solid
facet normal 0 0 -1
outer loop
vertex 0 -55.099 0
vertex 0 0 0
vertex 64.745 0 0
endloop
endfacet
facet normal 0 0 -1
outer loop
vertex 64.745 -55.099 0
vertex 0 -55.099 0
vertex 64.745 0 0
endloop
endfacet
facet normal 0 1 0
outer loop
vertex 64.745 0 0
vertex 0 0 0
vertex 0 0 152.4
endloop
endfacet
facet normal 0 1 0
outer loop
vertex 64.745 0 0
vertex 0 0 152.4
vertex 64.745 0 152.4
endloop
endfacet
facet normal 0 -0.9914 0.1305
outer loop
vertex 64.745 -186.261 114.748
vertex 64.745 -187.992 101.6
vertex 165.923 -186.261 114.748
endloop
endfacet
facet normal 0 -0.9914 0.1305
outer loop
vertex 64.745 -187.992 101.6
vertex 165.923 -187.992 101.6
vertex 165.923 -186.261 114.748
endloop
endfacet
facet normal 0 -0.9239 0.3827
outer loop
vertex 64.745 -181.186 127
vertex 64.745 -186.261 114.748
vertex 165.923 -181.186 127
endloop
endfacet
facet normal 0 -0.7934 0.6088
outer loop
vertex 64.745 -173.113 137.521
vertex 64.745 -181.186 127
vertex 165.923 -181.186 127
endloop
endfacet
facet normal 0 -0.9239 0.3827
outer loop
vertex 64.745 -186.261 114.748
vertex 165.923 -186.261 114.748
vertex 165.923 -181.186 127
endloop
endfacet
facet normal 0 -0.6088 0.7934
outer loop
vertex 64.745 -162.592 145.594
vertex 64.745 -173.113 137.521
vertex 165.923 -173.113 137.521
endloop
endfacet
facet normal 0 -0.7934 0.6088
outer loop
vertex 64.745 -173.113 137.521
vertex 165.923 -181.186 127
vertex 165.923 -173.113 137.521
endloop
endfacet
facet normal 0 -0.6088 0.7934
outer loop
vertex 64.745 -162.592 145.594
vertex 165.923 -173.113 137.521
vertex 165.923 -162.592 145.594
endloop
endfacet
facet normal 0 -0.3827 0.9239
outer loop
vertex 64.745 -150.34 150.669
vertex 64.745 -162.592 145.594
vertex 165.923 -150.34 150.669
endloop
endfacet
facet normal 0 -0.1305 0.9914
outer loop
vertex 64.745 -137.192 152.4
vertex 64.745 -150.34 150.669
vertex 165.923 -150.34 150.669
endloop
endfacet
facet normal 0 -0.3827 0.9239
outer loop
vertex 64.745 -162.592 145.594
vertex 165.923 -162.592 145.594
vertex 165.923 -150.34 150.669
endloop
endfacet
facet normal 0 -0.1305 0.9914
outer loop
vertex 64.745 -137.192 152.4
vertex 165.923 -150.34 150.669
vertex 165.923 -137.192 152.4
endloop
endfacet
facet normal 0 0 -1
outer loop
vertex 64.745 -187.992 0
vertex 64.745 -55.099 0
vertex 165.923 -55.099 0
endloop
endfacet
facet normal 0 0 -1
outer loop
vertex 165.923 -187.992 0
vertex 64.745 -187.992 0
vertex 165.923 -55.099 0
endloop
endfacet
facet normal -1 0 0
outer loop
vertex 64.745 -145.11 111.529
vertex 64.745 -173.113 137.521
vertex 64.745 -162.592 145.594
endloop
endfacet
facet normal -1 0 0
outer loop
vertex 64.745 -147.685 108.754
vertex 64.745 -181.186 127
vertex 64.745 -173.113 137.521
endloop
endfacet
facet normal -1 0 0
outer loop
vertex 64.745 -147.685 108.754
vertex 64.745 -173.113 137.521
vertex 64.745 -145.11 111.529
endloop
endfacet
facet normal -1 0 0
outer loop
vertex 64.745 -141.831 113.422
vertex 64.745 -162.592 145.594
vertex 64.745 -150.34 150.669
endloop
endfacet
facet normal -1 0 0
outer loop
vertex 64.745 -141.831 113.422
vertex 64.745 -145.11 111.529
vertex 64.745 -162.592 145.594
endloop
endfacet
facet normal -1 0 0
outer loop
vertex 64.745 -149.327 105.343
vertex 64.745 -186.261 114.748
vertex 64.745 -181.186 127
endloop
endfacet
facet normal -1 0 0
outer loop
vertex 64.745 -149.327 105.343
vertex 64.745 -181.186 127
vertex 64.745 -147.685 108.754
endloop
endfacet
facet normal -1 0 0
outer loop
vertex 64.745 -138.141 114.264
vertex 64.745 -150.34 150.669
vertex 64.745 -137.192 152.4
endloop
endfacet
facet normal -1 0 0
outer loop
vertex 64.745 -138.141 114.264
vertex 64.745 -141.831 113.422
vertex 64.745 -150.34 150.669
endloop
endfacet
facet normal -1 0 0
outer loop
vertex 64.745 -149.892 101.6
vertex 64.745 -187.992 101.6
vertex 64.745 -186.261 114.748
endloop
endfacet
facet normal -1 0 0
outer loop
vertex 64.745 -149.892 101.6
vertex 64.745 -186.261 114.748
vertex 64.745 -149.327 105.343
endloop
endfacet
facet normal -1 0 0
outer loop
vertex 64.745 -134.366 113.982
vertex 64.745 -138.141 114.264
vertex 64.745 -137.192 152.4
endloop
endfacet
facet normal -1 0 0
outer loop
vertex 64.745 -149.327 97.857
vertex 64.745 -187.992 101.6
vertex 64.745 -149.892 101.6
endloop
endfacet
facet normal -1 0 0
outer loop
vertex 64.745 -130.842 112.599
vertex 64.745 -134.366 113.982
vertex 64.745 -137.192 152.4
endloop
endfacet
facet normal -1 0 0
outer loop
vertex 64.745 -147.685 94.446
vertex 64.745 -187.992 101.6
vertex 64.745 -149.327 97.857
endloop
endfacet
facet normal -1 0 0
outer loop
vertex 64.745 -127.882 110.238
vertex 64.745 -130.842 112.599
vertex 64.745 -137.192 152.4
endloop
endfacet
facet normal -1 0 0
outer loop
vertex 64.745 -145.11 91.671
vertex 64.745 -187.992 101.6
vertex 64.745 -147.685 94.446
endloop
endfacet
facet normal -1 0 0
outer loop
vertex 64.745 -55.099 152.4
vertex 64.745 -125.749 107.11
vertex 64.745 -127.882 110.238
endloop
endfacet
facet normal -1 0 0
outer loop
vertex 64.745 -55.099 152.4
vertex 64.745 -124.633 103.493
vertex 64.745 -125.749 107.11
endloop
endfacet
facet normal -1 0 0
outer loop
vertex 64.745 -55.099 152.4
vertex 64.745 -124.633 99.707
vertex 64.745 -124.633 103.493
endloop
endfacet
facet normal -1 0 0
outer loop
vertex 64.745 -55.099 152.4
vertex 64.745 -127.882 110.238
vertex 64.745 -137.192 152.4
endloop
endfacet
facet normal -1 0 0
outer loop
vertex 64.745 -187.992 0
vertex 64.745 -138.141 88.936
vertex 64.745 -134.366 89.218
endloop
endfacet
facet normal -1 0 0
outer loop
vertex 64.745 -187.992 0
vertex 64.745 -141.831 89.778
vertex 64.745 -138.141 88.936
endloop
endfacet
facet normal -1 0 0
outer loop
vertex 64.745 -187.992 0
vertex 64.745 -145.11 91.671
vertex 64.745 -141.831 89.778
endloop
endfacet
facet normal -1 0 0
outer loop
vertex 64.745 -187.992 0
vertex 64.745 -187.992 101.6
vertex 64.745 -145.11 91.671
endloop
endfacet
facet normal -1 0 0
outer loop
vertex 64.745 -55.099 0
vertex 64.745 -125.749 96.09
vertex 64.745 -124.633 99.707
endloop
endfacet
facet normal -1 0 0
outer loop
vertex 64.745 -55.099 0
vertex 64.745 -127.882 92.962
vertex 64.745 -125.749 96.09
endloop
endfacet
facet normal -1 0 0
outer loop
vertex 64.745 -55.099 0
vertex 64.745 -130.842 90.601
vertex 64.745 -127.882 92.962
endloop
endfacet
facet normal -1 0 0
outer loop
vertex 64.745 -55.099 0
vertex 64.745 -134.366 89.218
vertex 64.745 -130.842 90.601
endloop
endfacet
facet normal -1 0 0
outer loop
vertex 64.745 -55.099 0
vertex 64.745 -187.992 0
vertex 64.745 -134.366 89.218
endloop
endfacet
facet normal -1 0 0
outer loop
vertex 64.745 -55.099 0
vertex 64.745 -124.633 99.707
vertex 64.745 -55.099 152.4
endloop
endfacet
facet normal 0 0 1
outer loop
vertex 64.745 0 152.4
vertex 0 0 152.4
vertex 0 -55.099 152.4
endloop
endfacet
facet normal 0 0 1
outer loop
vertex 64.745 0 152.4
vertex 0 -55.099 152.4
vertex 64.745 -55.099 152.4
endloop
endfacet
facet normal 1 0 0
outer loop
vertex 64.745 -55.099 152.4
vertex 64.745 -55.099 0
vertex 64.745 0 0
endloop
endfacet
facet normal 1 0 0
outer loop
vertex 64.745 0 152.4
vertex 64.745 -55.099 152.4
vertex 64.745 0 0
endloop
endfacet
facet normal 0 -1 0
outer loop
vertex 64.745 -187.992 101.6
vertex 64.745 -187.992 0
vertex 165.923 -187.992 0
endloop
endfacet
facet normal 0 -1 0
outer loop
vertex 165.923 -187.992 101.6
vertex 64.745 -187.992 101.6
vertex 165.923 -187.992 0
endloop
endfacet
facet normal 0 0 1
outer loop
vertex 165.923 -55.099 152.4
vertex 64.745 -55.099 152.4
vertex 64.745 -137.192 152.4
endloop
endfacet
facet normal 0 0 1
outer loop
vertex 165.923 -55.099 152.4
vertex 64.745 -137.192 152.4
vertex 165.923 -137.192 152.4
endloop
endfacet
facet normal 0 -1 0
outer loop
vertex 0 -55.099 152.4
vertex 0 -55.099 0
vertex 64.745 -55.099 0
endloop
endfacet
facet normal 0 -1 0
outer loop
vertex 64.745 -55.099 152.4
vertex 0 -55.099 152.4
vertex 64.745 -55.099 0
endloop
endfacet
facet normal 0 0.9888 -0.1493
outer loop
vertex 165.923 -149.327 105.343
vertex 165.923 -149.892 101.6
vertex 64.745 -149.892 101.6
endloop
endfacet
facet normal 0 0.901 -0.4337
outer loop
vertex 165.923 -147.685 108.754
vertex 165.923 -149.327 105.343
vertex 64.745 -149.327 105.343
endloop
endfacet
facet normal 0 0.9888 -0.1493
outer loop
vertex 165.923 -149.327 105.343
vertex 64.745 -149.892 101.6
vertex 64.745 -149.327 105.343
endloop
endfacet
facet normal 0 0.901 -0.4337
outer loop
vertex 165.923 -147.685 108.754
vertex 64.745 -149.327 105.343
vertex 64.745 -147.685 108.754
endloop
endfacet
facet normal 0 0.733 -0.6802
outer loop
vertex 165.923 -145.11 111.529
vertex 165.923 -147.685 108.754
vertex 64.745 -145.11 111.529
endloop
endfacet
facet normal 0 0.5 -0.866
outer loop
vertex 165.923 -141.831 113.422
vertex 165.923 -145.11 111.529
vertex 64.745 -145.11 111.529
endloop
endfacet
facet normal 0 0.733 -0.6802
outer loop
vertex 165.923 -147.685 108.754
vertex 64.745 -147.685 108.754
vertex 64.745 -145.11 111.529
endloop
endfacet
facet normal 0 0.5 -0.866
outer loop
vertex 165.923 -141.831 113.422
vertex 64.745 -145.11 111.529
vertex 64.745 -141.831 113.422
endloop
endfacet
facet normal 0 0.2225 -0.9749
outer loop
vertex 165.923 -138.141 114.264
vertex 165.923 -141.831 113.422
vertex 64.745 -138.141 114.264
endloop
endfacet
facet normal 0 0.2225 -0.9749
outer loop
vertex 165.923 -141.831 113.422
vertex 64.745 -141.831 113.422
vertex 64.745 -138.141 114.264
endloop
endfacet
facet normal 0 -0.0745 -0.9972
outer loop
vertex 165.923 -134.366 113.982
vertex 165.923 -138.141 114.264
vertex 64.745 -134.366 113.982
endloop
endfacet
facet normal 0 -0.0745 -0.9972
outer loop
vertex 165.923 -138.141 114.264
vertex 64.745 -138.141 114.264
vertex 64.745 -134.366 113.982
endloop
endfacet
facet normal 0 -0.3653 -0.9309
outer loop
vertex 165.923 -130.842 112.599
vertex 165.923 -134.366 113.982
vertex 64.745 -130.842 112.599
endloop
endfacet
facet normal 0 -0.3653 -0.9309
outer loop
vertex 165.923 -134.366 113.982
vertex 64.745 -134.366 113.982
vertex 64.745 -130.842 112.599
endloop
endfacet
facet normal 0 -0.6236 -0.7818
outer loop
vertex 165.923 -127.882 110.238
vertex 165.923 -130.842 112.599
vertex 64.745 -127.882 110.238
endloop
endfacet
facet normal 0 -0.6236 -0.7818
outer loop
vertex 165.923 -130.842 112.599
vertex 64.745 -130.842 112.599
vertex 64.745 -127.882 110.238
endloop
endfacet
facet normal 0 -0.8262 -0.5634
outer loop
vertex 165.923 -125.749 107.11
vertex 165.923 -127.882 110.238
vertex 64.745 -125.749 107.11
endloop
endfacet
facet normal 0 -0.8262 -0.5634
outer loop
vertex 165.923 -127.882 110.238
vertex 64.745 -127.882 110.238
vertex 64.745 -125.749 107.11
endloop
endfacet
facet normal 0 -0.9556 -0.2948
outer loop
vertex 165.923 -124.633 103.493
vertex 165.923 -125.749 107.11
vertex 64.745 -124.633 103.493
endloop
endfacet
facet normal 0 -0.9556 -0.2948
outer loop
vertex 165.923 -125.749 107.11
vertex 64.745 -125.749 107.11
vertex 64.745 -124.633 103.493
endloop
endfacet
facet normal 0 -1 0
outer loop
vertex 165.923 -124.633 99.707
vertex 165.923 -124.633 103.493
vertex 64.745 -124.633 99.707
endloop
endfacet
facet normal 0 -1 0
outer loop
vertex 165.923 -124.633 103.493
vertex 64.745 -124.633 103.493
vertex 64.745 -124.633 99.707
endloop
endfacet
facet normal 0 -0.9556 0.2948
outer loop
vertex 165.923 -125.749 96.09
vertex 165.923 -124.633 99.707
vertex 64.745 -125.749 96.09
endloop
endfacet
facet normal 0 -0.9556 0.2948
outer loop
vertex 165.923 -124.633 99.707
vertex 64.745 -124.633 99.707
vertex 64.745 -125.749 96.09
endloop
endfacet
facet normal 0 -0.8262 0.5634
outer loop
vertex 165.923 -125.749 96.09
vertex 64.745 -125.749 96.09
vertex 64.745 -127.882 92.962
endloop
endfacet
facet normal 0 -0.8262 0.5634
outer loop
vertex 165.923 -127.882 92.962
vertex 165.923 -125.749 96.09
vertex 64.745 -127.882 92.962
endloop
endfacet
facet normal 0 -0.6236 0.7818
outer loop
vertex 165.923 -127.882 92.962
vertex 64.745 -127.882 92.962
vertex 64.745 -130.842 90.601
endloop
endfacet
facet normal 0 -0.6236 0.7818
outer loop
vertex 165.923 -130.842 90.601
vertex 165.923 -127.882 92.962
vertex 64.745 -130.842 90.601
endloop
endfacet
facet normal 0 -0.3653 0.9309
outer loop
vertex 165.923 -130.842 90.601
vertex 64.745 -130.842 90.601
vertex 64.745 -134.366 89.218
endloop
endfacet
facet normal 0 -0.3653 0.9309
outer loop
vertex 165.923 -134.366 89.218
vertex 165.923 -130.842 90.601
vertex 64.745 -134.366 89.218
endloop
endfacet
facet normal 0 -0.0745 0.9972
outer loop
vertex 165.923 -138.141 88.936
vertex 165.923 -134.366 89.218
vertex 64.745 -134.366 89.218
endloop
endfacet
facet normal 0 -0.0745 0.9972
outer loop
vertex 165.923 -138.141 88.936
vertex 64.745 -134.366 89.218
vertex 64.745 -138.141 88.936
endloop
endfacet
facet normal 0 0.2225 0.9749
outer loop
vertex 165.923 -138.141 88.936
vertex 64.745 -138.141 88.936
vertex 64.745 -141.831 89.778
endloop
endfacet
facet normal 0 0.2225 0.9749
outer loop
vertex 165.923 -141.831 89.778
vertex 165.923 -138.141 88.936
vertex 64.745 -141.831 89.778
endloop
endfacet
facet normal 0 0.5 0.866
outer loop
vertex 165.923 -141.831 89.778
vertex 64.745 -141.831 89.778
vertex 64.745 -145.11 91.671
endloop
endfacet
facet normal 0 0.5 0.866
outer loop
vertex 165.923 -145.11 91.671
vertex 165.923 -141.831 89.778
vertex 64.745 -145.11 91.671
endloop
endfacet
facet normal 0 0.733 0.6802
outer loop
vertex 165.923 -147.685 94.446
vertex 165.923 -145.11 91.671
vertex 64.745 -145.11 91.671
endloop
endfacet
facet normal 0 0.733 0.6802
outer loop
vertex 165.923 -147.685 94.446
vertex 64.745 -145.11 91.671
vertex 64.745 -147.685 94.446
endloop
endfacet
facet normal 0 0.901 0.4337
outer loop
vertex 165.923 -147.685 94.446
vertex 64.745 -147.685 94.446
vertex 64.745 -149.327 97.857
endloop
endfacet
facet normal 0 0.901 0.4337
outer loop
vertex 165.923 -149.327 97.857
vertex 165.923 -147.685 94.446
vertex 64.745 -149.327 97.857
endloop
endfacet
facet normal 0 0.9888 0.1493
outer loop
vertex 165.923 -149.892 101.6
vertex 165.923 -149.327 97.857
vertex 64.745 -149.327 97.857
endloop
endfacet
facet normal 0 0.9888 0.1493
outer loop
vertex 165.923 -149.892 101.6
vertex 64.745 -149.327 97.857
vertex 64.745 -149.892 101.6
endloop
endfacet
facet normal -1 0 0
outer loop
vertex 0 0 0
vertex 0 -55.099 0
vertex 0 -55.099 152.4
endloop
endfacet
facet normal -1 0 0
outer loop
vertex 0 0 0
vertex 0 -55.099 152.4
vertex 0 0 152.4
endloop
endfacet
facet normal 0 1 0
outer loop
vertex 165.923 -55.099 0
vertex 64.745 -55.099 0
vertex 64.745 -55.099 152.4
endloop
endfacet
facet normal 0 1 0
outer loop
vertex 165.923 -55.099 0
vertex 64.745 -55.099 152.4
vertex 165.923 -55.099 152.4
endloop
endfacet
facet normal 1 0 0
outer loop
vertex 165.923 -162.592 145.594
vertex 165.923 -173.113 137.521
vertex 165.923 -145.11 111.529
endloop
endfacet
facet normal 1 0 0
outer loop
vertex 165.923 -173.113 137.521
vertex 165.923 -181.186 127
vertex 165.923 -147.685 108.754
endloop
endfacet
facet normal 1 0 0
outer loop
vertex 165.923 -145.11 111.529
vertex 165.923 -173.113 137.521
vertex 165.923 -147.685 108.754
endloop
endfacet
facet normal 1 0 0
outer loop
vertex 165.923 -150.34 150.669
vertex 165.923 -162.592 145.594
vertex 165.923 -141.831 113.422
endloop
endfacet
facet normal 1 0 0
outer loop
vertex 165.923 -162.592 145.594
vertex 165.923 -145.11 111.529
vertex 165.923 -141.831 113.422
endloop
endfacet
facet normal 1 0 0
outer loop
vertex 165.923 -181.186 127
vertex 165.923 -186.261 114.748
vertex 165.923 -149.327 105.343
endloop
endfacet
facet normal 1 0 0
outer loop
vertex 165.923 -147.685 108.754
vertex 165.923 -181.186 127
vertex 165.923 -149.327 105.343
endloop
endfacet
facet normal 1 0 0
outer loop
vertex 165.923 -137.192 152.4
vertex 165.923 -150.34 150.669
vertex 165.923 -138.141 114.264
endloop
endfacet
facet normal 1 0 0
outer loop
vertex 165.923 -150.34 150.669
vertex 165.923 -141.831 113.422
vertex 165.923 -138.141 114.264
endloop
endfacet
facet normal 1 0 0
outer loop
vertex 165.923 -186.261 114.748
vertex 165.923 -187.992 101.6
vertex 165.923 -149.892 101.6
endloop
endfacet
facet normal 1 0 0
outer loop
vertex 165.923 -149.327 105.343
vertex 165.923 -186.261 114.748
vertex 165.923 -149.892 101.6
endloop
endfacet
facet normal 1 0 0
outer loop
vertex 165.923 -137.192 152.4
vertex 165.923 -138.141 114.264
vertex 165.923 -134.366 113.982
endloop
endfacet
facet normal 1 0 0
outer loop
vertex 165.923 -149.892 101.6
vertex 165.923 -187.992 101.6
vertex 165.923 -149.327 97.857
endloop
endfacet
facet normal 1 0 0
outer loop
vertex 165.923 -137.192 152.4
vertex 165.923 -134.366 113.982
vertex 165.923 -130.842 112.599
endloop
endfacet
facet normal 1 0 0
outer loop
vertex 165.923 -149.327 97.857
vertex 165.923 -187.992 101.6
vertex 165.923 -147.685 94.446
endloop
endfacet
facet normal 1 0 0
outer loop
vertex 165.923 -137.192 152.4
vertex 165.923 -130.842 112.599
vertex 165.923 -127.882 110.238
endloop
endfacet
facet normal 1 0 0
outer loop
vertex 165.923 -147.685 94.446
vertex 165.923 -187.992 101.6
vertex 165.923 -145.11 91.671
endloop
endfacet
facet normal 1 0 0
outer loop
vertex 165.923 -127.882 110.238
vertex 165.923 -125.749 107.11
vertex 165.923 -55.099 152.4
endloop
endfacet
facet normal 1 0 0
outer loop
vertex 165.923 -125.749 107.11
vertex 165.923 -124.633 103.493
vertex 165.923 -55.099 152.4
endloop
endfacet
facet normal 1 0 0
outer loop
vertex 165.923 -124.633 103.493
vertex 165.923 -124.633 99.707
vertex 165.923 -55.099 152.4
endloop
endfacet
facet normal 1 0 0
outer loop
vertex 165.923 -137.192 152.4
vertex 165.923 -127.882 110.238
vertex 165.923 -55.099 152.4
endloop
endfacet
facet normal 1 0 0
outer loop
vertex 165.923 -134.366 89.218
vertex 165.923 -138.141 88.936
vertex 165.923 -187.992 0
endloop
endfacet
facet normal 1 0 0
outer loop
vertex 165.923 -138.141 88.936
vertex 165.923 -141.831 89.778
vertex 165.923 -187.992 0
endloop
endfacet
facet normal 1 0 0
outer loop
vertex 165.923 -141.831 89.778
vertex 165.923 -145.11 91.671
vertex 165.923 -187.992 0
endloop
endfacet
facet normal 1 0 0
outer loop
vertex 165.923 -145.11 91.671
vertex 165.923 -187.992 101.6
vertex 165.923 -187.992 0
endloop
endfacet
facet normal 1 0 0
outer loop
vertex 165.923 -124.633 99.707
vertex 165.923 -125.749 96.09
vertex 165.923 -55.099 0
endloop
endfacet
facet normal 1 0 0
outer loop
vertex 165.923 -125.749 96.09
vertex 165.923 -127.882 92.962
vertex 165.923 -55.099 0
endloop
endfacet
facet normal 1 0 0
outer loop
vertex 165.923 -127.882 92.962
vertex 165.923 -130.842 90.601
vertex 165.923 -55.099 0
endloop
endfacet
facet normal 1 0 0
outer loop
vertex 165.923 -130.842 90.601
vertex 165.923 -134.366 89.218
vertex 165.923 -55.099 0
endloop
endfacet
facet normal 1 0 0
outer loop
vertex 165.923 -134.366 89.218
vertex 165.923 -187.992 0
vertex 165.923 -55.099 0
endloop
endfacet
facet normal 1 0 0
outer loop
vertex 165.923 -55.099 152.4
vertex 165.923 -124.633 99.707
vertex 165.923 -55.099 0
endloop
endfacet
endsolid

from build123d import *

# Parameters (mm, degrees)
F0_W     = 101.178363
F0_H     = 132.892825
F0_W_2   = 64.745098
F0_H_2   = 55.098824
F1_DEPTH = 152.4
F2_R     = 50.8
F4_D     = 25.4


with BuildPart() as f1:
    # F0 (on Top) → F1 (new body)
    with BuildSketch(Plane.XY):
        with Locations((115.33428, -121.545237)):
            Rectangle(F0_W, F0_H)
        with Locations((32.372549, -27.549412)):
            Rectangle(F0_W_2, F0_H_2)
    extrude(amount=F1_DEPTH)

    # F2
    f2_edges = [f1.edges().sort_by_distance(p)[0] for p in [
        (115.33428, -187.991649, 152.4),
    ]]
    fillet(f2_edges, radius=F2_R)

    # F4 (through all)
    with Locations(Plane.YZ.offset(165.923461)):
        with Locations((-137.191649, 101.6)):
            Hole(F4_D / 2)


solid = f1.part
